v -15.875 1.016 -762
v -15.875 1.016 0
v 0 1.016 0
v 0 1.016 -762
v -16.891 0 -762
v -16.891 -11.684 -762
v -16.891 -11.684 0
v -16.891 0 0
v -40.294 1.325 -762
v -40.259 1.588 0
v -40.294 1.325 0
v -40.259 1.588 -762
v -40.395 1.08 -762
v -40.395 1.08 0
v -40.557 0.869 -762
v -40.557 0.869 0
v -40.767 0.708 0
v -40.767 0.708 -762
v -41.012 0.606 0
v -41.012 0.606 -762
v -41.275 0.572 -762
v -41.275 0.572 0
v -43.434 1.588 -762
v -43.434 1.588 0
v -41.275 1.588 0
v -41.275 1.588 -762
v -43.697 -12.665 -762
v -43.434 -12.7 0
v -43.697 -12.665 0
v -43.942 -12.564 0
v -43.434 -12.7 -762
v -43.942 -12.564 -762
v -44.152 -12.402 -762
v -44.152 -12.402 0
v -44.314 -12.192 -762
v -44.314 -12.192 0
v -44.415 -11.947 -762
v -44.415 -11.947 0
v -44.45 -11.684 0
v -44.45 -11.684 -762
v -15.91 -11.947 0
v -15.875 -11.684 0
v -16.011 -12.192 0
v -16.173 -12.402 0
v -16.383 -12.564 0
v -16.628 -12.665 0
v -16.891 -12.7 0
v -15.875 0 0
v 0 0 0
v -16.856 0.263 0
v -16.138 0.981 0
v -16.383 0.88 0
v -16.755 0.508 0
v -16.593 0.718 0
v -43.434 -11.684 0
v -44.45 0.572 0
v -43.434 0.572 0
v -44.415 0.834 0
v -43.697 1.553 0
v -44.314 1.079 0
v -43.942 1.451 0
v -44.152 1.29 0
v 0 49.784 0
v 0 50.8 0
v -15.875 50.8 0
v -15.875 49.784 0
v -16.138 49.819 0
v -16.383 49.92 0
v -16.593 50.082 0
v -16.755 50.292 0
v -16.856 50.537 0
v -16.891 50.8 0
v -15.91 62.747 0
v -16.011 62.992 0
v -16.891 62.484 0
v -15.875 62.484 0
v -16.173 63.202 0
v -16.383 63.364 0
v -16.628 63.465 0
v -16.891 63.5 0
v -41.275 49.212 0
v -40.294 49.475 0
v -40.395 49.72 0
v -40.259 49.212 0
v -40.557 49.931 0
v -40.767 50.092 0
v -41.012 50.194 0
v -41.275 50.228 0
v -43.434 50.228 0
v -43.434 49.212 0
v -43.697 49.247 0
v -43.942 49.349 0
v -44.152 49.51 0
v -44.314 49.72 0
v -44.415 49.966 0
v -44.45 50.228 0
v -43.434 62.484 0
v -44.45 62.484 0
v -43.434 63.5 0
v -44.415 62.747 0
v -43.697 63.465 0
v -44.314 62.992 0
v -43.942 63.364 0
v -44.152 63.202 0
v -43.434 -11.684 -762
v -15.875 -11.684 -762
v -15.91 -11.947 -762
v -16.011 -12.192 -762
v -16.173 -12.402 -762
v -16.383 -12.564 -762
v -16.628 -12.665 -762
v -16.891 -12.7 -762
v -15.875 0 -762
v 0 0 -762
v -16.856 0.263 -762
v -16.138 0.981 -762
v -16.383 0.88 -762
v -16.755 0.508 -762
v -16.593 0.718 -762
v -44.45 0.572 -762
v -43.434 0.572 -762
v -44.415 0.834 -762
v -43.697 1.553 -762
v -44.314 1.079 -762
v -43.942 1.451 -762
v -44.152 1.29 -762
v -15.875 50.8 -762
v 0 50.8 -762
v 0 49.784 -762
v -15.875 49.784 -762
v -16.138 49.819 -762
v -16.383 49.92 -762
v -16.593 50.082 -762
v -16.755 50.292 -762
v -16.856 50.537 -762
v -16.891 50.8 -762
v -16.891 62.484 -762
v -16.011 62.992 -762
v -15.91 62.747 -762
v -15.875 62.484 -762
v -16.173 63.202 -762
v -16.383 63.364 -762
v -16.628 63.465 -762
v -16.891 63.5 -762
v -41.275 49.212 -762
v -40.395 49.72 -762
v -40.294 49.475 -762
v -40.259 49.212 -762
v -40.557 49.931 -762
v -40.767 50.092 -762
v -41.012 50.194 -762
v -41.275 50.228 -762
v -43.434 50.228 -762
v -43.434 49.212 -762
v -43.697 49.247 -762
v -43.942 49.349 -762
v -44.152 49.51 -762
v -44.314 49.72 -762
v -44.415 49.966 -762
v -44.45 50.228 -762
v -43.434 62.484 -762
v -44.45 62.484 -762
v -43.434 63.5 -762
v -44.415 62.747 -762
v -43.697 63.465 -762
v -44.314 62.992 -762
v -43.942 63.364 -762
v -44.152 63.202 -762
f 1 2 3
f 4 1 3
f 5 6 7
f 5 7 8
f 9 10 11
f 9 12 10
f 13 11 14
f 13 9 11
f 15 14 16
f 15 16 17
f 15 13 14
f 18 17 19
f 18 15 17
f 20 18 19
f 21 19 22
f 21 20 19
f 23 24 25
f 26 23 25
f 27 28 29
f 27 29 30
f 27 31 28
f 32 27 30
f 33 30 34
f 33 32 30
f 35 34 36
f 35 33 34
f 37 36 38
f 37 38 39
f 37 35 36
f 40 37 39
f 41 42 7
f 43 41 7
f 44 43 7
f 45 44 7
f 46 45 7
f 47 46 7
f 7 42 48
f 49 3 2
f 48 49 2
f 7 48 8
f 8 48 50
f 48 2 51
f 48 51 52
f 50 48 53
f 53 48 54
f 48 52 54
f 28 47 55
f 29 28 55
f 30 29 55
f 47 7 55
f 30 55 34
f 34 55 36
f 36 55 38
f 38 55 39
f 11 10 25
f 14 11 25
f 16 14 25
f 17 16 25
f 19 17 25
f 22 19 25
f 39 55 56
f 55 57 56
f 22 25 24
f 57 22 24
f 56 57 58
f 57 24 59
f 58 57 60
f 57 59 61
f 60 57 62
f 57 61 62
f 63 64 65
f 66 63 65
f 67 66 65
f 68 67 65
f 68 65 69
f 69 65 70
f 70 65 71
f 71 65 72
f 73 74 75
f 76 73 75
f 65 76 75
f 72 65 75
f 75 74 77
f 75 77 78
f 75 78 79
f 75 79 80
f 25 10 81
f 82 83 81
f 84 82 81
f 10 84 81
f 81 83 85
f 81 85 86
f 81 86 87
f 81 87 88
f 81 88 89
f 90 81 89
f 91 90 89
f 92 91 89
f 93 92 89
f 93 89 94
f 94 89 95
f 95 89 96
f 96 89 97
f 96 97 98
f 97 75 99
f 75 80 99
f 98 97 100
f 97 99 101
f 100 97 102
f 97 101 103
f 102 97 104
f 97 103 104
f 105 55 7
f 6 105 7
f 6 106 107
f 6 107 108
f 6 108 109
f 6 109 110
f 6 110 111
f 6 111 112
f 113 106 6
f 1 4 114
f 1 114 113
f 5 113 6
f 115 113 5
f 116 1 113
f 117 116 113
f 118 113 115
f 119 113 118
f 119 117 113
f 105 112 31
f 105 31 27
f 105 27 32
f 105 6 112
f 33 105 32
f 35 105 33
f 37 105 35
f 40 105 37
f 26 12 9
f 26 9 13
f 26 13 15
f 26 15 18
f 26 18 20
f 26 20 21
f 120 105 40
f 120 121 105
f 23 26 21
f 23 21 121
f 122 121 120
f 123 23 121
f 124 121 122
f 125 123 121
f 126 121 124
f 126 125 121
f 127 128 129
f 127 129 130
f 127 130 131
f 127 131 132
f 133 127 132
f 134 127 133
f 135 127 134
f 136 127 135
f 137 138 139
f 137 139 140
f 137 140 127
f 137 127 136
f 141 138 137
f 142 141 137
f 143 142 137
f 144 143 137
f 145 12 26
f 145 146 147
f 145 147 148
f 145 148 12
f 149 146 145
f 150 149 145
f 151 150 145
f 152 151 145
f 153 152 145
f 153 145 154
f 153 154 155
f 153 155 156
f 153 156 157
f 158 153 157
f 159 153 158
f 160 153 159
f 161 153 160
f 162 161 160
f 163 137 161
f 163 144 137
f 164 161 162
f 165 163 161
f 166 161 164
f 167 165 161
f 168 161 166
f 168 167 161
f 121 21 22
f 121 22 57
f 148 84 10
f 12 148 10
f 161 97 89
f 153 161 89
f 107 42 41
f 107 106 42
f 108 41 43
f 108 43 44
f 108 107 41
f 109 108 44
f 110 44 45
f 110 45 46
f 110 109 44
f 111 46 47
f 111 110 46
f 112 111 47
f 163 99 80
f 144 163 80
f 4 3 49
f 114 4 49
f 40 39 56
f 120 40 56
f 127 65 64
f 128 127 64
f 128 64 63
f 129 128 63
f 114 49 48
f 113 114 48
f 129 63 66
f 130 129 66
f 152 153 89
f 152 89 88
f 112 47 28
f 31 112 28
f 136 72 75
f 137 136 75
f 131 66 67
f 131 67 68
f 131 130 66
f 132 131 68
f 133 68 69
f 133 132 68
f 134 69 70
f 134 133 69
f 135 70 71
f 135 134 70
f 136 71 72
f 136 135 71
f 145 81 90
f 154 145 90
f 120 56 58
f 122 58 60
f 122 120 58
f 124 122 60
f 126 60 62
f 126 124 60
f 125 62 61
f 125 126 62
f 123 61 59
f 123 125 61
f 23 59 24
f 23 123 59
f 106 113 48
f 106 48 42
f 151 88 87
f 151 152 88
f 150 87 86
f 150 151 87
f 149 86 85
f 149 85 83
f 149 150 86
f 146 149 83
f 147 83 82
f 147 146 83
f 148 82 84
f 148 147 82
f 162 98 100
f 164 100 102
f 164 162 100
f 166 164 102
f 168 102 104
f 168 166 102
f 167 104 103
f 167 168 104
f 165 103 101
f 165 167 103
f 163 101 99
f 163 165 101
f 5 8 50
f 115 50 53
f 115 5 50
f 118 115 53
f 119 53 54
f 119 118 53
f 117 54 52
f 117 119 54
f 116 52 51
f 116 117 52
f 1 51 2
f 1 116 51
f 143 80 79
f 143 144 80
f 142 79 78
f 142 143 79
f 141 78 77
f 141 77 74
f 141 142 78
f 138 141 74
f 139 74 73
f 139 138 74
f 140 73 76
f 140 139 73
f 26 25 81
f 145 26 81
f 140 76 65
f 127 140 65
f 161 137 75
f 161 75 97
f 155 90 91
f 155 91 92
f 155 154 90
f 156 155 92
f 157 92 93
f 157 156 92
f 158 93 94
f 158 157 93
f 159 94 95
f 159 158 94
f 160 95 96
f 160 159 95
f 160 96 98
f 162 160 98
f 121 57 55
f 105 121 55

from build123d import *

# Parameters (mm, degrees)
EXTRUDE_THIN1_DEPTH = 762
FILLET1_R           = 1.016


with BuildPart() as part:
    # Sketch1 → Extrude-Thin1 (new body)
    with BuildSketch(Plane.XY):
        Polygon((0, 0), (-15.875, 0), (-15.875, -12.7), (-44.45, -12.7), (-44.45, 1.5875), (-41.275, 1.5875), (-41.275, 49.2125), (-44.45, 49.2125), (-44.45, 63.5), (-15.875, 63.5), (-15.875, 50.8), (0, 50.8), (0, 49.784), (-16.891, 49.784), (-16.891, 62.484), (-43.434, 62.484), (-43.434, 50.2285), (-40.259, 50.2285), (-40.259, 0.5715), (-43.434, 0.5715), (-43.434, -11.684), (-16.891, -11.684), (-16.891, 1.016), (0, 1.016), align=None)
    extrude(amount=-EXTRUDE_THIN1_DEPTH)

    # Fillet1
    fillet1_edges = [part.edges().sort_by_distance(p)[0] for p in [
        (-16.891, 49.784, -381),
        (-40.259, 50.2285, -381),
        (-40.259, 0.5715, -381),
        (-16.891, 1.016, -381),
        (-15.875, -12.7, -381),
        (-44.45, -12.7, -381),
        (-44.45, 1.5875, -381),
        (-44.45, 49.2125, -381),
        (-44.45, 63.5, -381),
        (-15.875, 63.5, -381),
    ]]
    fillet(fillet1_edges, radius=FILLET1_R)


solid = part.part
